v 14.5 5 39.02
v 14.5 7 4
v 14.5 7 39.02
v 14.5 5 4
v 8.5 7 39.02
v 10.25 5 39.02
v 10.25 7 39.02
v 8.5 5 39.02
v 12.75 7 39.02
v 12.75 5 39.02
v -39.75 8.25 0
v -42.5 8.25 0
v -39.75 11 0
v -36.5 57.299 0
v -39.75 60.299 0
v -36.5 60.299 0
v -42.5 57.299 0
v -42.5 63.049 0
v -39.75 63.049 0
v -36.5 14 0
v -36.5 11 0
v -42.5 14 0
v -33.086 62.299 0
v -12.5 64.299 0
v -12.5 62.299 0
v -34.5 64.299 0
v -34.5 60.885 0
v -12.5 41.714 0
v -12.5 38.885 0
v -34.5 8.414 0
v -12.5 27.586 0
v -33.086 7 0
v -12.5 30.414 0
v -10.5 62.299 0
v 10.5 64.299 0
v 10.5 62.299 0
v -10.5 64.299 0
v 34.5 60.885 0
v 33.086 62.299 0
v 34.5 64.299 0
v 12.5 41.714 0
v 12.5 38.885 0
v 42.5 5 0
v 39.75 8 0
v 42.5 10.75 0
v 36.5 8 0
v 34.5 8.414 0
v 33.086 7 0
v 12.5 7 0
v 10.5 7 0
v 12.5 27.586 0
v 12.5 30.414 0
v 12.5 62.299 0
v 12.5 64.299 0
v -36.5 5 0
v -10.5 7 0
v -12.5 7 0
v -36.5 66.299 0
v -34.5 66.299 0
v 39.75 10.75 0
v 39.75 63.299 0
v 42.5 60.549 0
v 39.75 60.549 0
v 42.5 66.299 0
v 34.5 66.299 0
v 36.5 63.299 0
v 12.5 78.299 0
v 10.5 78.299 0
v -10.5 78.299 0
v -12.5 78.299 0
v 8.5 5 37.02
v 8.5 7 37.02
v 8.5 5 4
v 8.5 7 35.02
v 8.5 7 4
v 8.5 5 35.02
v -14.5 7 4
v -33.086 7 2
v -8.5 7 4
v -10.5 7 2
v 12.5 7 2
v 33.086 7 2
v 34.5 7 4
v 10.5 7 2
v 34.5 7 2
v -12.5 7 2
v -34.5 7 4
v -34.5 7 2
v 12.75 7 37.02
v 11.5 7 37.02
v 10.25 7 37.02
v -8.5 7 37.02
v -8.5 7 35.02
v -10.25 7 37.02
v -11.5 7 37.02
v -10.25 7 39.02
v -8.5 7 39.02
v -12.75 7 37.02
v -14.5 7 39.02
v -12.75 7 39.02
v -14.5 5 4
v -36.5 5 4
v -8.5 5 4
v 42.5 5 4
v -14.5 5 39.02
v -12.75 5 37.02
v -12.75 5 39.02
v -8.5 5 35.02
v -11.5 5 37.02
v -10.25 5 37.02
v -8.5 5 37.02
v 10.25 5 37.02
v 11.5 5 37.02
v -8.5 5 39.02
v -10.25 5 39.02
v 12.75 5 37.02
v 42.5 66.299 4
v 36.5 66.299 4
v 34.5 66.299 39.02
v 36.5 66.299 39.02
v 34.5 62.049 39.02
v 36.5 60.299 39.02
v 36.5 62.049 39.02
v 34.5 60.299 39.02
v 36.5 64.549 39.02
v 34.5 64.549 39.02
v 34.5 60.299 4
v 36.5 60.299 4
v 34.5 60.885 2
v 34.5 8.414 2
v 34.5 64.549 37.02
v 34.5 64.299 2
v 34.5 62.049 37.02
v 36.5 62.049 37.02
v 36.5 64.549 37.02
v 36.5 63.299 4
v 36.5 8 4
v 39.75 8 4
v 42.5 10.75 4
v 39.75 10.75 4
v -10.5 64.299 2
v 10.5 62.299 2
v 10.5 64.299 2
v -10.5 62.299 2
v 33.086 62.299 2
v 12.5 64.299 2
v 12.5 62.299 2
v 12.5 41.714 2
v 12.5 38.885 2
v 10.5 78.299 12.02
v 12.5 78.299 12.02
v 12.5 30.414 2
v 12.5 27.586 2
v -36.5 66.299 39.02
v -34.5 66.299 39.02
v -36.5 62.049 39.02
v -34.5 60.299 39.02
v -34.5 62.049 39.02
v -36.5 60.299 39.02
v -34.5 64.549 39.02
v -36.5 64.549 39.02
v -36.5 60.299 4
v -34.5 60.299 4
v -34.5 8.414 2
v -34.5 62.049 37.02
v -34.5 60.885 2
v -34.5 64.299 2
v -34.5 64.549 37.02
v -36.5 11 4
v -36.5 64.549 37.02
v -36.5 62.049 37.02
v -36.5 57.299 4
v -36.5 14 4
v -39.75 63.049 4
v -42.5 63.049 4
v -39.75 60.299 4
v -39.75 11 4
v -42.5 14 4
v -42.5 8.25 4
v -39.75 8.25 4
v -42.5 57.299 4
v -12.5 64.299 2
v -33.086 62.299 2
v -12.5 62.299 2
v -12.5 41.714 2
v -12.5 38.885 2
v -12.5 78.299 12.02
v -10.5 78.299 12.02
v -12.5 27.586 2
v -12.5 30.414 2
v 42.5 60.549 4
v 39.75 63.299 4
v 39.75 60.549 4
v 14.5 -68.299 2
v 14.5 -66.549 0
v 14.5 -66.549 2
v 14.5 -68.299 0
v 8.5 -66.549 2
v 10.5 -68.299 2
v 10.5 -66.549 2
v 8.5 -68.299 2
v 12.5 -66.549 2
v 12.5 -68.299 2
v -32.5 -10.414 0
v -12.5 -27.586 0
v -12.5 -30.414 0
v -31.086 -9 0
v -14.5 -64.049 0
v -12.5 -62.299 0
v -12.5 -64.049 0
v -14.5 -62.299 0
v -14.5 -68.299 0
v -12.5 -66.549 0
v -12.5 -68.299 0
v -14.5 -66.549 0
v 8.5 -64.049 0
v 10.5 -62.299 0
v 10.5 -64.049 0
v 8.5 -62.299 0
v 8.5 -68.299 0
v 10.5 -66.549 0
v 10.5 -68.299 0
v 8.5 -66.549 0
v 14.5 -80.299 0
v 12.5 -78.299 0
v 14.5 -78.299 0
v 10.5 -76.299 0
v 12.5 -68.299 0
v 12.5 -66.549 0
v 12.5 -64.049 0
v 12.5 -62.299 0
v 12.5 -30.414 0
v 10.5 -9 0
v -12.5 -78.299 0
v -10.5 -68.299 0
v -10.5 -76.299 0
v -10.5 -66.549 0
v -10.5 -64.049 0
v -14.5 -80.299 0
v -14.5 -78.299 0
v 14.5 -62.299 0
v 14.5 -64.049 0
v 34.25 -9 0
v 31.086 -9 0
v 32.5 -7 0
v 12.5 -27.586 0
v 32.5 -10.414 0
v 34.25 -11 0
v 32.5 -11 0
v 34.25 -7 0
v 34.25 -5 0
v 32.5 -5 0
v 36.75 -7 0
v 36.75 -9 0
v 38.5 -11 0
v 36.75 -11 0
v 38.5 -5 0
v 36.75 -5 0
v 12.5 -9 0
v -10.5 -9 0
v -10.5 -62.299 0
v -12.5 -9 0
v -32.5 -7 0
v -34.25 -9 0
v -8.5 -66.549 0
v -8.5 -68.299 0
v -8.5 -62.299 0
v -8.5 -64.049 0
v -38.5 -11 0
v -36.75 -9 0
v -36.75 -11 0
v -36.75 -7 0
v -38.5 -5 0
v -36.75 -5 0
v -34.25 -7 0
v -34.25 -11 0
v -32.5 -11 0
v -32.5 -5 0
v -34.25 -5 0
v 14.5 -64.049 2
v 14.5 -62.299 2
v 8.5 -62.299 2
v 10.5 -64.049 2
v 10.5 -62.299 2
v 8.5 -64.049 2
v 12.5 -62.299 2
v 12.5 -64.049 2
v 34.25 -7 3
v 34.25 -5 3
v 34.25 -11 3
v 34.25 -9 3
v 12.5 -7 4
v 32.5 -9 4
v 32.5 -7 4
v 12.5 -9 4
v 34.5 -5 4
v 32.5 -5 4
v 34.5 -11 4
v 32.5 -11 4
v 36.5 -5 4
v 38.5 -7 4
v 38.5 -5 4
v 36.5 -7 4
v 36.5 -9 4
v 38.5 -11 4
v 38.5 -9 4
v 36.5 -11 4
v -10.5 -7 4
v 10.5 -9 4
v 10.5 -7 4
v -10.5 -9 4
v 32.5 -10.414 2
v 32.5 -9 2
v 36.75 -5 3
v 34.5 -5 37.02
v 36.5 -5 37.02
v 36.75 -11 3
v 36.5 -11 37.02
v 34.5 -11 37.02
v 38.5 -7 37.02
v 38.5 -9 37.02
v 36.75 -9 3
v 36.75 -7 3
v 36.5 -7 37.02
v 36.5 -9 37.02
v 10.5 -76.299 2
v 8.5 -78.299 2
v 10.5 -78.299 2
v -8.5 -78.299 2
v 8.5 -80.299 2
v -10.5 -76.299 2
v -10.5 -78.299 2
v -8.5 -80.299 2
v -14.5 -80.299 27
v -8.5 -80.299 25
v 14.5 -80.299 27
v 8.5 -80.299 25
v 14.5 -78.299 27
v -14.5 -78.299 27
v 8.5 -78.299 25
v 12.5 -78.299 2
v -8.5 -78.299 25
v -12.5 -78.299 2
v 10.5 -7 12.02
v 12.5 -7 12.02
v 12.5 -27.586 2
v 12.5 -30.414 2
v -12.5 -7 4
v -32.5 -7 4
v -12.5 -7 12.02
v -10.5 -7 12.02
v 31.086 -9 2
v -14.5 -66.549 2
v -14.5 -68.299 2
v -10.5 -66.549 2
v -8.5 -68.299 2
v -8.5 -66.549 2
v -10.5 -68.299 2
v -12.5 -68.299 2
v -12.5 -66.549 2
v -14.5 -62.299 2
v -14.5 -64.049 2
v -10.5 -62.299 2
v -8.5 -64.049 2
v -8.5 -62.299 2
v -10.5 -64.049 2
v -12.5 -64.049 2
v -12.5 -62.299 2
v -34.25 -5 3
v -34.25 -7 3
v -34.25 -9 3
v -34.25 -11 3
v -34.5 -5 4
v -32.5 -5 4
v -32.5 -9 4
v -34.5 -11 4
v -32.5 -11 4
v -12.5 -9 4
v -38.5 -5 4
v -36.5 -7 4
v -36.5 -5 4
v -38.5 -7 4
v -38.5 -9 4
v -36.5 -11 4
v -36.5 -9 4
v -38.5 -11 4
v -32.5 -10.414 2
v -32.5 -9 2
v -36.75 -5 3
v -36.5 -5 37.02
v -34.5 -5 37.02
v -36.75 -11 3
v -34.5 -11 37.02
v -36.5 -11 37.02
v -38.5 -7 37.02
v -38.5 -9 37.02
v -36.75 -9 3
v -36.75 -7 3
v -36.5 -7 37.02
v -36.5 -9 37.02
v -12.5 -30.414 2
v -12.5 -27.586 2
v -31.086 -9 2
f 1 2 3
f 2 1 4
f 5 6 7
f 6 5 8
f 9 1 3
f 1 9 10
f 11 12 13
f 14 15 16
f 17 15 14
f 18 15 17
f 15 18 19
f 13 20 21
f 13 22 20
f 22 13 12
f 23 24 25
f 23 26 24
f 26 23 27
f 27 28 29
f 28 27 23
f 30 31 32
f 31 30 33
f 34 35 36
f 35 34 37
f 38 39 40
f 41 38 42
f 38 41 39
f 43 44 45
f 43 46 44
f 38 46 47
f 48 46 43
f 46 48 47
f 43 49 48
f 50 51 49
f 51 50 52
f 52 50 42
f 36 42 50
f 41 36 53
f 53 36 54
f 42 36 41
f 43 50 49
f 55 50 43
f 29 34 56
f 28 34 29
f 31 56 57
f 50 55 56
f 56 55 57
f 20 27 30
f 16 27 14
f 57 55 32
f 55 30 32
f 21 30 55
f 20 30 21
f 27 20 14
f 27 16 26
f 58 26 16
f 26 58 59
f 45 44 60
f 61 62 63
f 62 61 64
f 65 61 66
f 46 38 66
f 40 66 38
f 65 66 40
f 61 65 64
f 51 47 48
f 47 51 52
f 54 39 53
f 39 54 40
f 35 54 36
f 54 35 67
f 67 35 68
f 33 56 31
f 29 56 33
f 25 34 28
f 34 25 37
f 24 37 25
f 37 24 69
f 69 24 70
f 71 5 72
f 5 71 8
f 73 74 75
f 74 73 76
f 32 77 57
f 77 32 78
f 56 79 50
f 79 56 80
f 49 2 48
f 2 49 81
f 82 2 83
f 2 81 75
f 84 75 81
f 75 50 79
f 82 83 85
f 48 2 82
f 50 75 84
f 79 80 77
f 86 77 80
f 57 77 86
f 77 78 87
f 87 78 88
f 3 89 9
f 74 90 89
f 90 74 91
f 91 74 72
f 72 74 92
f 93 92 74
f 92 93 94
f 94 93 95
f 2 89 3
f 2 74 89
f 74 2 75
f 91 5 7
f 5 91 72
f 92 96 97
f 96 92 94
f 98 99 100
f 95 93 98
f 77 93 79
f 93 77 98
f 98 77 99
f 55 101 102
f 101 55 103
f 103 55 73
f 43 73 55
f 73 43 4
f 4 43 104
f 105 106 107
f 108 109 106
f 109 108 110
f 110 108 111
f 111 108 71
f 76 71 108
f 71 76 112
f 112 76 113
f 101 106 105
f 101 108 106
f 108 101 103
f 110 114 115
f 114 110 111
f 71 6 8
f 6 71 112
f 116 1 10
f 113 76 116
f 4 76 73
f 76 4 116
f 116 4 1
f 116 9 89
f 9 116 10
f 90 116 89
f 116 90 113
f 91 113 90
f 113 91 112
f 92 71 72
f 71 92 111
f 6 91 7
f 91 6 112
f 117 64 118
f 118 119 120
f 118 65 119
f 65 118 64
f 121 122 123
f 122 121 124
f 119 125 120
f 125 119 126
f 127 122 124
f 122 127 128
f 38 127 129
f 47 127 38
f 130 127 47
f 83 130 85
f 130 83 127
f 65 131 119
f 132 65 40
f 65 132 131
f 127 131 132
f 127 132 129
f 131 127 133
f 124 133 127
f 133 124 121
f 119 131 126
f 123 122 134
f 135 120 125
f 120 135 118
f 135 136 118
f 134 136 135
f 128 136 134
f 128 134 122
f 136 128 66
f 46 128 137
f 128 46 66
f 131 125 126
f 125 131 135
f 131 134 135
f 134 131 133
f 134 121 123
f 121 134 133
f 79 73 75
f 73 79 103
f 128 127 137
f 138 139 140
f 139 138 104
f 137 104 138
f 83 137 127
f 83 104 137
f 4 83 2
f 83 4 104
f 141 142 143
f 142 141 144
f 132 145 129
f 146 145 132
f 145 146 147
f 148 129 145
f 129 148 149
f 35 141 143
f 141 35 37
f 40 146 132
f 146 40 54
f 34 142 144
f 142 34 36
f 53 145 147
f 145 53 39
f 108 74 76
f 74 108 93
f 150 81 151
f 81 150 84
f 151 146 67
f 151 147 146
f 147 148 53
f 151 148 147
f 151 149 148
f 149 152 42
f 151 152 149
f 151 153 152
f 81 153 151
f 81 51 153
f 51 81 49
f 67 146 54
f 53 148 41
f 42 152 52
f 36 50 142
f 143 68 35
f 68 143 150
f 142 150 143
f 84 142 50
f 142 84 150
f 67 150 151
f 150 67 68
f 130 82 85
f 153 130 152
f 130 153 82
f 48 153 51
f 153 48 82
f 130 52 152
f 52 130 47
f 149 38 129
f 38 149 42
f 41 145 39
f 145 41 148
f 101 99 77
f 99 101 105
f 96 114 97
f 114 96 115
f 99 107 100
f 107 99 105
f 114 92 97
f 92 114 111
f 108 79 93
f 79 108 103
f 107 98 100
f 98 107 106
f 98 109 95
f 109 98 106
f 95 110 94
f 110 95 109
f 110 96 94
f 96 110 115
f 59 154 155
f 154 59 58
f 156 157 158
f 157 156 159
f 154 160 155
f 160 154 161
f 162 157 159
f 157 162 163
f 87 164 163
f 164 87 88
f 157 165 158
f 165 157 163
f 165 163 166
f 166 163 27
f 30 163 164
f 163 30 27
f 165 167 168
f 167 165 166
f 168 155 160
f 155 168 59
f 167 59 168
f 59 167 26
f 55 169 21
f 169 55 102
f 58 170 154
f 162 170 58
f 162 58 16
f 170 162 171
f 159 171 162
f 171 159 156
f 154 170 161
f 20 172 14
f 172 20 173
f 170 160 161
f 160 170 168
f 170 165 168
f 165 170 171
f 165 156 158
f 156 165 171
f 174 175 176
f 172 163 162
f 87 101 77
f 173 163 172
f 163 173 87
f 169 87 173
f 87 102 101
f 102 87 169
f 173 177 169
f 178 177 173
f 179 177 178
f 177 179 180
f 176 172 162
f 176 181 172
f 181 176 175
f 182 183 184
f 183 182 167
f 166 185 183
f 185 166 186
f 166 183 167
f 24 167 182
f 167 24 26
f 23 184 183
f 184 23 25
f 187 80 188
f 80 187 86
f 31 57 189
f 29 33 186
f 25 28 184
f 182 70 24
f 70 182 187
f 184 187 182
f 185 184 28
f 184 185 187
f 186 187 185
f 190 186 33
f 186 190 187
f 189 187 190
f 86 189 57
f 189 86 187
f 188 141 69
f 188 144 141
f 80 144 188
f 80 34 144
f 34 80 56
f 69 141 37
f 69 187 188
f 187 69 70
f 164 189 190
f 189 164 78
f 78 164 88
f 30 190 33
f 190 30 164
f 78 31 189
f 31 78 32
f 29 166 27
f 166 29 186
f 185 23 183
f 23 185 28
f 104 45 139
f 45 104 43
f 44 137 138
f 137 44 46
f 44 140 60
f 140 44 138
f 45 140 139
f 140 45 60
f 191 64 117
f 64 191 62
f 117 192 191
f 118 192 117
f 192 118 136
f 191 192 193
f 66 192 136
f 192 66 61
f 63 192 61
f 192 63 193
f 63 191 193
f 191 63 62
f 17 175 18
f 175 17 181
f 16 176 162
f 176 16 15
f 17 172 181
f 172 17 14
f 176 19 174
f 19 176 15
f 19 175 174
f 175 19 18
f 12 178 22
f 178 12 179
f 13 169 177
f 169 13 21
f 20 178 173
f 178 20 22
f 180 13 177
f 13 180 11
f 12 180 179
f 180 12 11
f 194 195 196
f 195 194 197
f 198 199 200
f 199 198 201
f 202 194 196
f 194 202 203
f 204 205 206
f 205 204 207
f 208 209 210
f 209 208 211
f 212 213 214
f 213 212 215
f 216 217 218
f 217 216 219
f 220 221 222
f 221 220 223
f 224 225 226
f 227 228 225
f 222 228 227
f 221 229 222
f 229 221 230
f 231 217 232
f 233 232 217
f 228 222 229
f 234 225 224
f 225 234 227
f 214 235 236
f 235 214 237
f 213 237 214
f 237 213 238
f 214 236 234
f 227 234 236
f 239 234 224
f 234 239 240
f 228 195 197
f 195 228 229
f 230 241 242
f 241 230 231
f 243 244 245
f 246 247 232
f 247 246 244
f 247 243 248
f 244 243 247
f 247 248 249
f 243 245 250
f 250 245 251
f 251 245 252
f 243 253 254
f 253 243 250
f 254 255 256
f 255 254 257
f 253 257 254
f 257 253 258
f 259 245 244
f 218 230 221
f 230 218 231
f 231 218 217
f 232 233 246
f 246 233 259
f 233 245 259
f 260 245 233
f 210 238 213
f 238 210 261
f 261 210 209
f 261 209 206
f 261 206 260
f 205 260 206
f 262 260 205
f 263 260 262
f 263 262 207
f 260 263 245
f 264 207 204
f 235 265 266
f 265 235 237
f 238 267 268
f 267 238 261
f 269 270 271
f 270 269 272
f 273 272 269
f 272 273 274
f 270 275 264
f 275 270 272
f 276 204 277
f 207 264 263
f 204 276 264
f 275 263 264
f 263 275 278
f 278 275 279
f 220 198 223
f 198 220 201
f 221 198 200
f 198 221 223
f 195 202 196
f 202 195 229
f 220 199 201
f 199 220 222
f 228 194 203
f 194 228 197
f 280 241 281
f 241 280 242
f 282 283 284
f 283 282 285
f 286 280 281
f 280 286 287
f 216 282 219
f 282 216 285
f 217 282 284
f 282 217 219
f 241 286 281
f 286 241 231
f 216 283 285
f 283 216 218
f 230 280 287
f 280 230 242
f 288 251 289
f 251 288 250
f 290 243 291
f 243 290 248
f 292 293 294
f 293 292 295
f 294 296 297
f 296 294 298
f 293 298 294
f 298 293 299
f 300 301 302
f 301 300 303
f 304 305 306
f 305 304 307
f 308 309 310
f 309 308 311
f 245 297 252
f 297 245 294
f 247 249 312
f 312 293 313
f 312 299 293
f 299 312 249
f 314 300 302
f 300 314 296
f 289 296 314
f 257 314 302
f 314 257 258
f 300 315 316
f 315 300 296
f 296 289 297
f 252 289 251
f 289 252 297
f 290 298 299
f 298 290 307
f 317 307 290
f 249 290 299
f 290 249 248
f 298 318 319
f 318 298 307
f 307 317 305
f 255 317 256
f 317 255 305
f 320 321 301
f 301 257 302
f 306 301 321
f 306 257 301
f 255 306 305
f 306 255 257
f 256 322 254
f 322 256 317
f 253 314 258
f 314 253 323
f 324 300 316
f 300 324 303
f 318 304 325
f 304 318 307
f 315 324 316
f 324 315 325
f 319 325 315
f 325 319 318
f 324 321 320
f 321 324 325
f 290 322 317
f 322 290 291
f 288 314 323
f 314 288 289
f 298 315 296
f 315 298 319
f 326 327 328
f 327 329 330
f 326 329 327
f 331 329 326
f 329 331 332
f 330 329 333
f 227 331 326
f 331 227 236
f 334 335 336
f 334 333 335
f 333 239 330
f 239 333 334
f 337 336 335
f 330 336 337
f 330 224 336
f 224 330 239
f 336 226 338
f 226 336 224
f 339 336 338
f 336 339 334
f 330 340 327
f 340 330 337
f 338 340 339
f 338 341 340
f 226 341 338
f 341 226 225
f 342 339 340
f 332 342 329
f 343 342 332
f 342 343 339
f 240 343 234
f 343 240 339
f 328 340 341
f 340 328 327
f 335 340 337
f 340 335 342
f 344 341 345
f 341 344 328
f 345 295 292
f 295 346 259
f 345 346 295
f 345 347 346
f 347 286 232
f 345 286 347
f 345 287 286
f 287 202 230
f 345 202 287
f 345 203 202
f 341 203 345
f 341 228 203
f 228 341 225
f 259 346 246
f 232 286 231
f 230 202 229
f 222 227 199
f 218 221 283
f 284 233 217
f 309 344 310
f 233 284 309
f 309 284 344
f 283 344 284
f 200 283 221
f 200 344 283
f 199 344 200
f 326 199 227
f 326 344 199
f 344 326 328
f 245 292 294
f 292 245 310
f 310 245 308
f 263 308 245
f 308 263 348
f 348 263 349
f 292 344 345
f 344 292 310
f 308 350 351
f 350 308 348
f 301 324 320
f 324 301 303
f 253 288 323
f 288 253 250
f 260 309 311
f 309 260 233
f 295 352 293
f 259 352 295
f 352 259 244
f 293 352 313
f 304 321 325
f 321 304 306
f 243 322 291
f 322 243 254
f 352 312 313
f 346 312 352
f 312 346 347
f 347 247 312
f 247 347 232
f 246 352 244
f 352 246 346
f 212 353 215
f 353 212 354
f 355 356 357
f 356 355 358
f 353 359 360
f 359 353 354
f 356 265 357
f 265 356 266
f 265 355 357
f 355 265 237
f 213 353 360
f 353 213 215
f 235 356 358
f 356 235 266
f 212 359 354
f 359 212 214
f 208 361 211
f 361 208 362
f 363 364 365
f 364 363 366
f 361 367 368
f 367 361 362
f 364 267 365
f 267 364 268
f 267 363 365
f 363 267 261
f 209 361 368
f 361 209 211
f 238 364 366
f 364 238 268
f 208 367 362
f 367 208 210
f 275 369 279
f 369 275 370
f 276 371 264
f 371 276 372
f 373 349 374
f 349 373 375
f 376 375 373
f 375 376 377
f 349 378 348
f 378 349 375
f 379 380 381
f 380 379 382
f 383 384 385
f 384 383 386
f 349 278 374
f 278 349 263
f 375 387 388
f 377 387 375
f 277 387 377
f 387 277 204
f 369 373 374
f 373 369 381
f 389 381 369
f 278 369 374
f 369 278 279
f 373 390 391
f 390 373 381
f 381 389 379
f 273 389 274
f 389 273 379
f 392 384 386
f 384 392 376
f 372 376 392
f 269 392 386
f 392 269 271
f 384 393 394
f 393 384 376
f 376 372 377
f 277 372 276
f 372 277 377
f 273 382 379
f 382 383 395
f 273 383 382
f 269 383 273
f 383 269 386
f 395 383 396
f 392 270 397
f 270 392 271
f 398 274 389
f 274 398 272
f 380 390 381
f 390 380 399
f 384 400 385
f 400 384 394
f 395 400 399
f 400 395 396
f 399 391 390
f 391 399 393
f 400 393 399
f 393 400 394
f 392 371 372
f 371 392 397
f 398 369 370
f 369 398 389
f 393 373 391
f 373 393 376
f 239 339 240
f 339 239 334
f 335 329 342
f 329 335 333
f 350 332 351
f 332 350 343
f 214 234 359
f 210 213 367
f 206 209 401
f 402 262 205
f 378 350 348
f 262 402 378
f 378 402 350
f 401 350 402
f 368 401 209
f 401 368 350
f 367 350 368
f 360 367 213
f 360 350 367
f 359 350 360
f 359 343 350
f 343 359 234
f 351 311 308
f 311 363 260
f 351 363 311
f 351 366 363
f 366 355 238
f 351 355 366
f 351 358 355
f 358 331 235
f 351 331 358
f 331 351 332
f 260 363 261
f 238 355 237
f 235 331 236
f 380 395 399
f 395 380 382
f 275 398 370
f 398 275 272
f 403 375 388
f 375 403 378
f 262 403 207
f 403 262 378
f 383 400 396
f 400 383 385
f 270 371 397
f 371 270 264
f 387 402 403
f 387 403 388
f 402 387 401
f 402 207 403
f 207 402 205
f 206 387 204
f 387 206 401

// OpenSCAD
/* [Main] */

// What would you like to generate?
part = "both"; // [base:Base Only,top:Top Only,both:Base and Top]

// Number of holders
holder_count = 1;

// Width of cards to be used (mm)
card_width = 64;

// Length of cards to be used (mm)
card_length = 88;

// Height of holder (approx height of deck) (mm)
holder_height = 25;	// Height of holder

/* [Tweaking] */

// How far back the top layer should be (mm)
top_offset = 14;
// How much the cards overhang the ends of the holder (mm)
overhang = 16;
// The angle of the angled supports
angle = 8;
// Gap added to card with to give width of holder
card_gap = 5;
// Thickness of support bars
bar_thickness = 2;
// Gap to allow top/bottom to clip together
support_gap = 0.25;
// Gap to allow clips to clip together
clip_card_gap = 0.25;
// Distance between top and bottom if printing both
both_gap = 10;


/****************************************
 *
 ****************************************/

holder_width = card_width + card_gap;
angled_length = cos(angle) * (card_length - overhang);;
angled_height = (tan(angle) * angled_length) + bar_thickness;
base_length = angled_length - top_offset;
base_full_length = angled_length + bar_thickness;
top_full_length = angled_length + (bar_thickness * 2);
clip_thickness = bar_thickness * 1.5;
// Offset of angled Support (1/6th from 1/2 = 1/3rd!)
offset = (holder_width) / 6;
// Offset for diagonal bars
diag_offset = sin(45) * bar_thickness;

print_part();

module print_part()
{
	if (part == "base")
	{
		bases();
	} else if (part == "top") {
		tops();
	} else if (part == "both") {
		// translate stuff here...
		translate([0, (base_full_length + both_gap) / 2, 0])
			bases();
		translate([0, -(top_full_length + both_gap) / 2, 0])
			tops();
	}
}

module tops()
{
	full_width = (holder_width + bar_thickness) * (holder_count) + (bar_thickness * 3);
	translate([full_width/2, -top_full_length/2, 0])
	{
		// Draw each base
		for(i=[1:holder_count])
		{
			translate([-(holder_width + bar_thickness) * (i-1),0,0])
				singleTop();
		}
		// Thicker bars at ends
		translate([-bar_thickness, angled_length, 0])
		{
			cube([bar_thickness, bar_thickness, holder_height + angled_height]);
		}
		translate([-full_width, angled_length, 0])
		{
			cube([bar_thickness, bar_thickness, holder_height + angled_height]);
		}
	}
}

module singleTop()
{
	// Length of diagonal bar
	diag_length = 
		(
			(offset*2 - bar_thickness)	// Distance between middle of angled support
												// 	and inside edge of side bar
			+ (diag_offset/2) 				// Distance from inside edge of side bar 
												//		to rotation axis of diagional bar
			+ (bar_thickness-diag_offset)	// Distance from rotation axis 
												//		to centre of diagonal bar
		) / sin(45);

	translate([-holder_width/2-(bar_thickness*2),0,0])
	{
		// As the base is mirrored down the middle, do a side at a time
		for (m=[[0,0,0],[1,0,0]])
		{
			mirror(m)
			{
				// Bar at back
				cube([offset, bar_thickness * 2, bar_thickness]);

				// Support at back
				translate([offset-(bar_thickness * 1.5),0,0])
					cube([bar_thickness * 3, bar_thickness, holder_height + bar_thickness]);
				translate([0,0,holder_height])
					cube([offset, bar_thickness, bar_thickness]);

				// Angled Support
				translate([offset-(bar_thickness * 0.5),bar_thickness,0])
					angledSupport();

				// Notches
				translate([offset-(bar_thickness * 1.5), 0, 0])
				{
					for(s=[
								[0, top_offset - bar_thickness, 0],
								[0, top_offset + bar_thickness + support_gap, 0]
							])
					{
						translate(s)
							cube([bar_thickness * 3, bar_thickness - support_gap, bar_thickness]);
					}
				}

				// Bar at front
				translate([0, angled_length, 0])
					cube([holder_width/2 + (bar_thickness * 2), bar_thickness, bar_thickness * 2]);

				// Front support
				translate([holder_width/2 - bar_thickness, angled_length - bar_thickness, 0])
				{
					for(t=[
							[0, 0, 0],
							[bar_thickness*2 + support_gap, 0, 0]
						])
					{
						translate(t)
							cube([bar_thickness - support_gap, bar_thickness * 3, bar_thickness * 2]);
					}

					translate([bar_thickness,0,bar_thickness * 1.5])
					{
						cube([bar_thickness, 
								bar_thickness * 3, 
								holder_height + angled_height - (bar_thickness * 1.5)]);
					}

					translate([0, 0, bar_thickness * 1.5])
						cube([bar_thickness * 3, bar_thickness * 3, bar_thickness * 0.5]);
				}

				// Diagonal supports
				translate([holder_width/2, angled_length + bar_thickness - diag_offset, 0])
					rotate([0,0,135])
						cube([bar_thickness,diag_length,bar_thickness]);
			}
		}
	}	
}


module bases()
{
	// Move bases so generated object is in middle of area
	translate([
			((holder_width * holder_count) + (bar_thickness * (holder_count + 1)))/2,
			-base_full_length/2,
			0])
	{
		// Draw each base
		for(i=[1:holder_count])
		{
			translate([-(holder_width + bar_thickness) * (i-1),0,0])
				singleBase();
		}

		// Add the clips - all mirrored/rotated in their own way

		clip();

		translate([0,base_length + (bar_thickness * 2),0])
			mirror([0,1,0])
				clip();	

		translate([-(holder_width + bar_thickness) * (holder_count) - bar_thickness,
						base_length + (bar_thickness * 2) - (clip_thickness * 3),
						0])
			mirror([1,0,0])
				clip();

		translate([-(holder_width + bar_thickness) * (holder_count) - bar_thickness,
						(clip_thickness * 3),
						0])
			rotate([0,0,180])
				clip();

	}
}


module singleBase()
{
	// Length of diagonal bar
	diag_length = 
		(
			(offset*2) 						// Distance between middle of angled support
												// 	and inside edge of side bar
			+ (diag_offset/2) 				// Distance from inside edge of side bar 
												//		to rotation axis of diagional bar
			+ (bar_thickness-diag_offset)	// Distance from rotation axis 
												//		to centre of diagonal bar
		) / sin(45);

	translate([-holder_width/2-bar_thickness,0,0])
	{
		// As the base is mirrored down the middle, do a side at a time
		for (m=[[0,0,0],[1,0,0]])
		{
			mirror(m)
			{
				// Bar at back
				cube([holder_width/2, bar_thickness, bar_thickness * 2]);
				// Bar at front
				translate([0,base_length,0])
					cube([holder_width/2, bar_thickness, bar_thickness]);
				// Bar at top of back support
				translate([0,0,holder_height + angled_height - bar_thickness])
					cube([offset, bar_thickness, bar_thickness]);		

				// Side bar
				translate([holder_width/2,0,0])
					cube([bar_thickness, base_length + bar_thickness, bar_thickness * 2]);

				// angled Support
				translate([offset-(bar_thickness * 0.5),bar_thickness,0])
					angledSupport();

				// Back support
				translate([offset-(bar_thickness * 1.5),0,0])
					verticalSupport();
				// Front support
				translate([holder_width/2 + bar_thickness,base_length - bar_thickness,0])
					rotate([0,0,90])
						verticalSupport();

				// Diagonal at back
				translate([holder_width/2 + (bar_thickness - diag_offset), 0, 0])
					rotate([0,0,45])
						cube([bar_thickness,diag_length,bar_thickness]);
				// Diagonal at front
				translate([holder_width/2 + bar_thickness, base_length + bar_thickness - diag_offset, 0])
					rotate([0,0,135])
						cube([bar_thickness,diag_length,bar_thickness]);
			}
		}
	}
}


module angledSupport()
{
/*
	// Calculate the maximum height of holes
	max_hole = floor(
		((angled_length - (bar_thickness * 2)) * tan(angle))
		- bar_thickness);

	difference()
	{
*/	
		// The triangle, with a bar of bar_thickness underneath
		polyhedron(points=[ 
			[0,0,0], [bar_thickness,0,0], 
			[0,angled_length,0], [bar_thickness,angled_length,0],
			[0,angled_length,angled_height], [bar_thickness,angled_length,angled_height],
			[0,0,bar_thickness], [bar_thickness,0,bar_thickness] ],
			faces=[
				[0,1,2], [1,3,2],
				[2,3,5], [2,5,4],
				[4,5,6], [5,7,6],
				[0,6,1], [6,7,1],
				[0,2,6], [2,4,6],
				[3,1,7], [5,3,7]
		]);
/*
		// Step through heights of holes and add them
		if(max_hole>0)
		{
			for (v=[bar_thickness+1:bar_thickness+max_hole])
			{
				translate([-0.1, v/tan(angle), bar_thickness])
					cube([bar_thickness + 0.2, 
							min((v+1)/tan(angle), angled_length)
								-(v/tan(angle))
								-bar_thickness,
							(v-bar_thickness)]);
			}
		}
	}
*/
}


module verticalSupport()
{
	difference() {
		cube([bar_thickness*3,bar_thickness,holder_height + angled_height + bar_thickness]);
		translate([bar_thickness-support_gap,0,holder_height + angled_height]) {
			cube([bar_thickness+(support_gap * 2),bar_thickness,bar_thickness * 1.1]);
		}
	}
}


module clip()
{
	translate([-bar_thickness,0,0])
		cube([clip_thickness * 2 + bar_thickness, clip_thickness, bar_thickness * 2]);
	translate([clip_thickness + clip_card_gap, clip_thickness, 0])
		cube([clip_thickness - clip_card_gap, clip_thickness - clip_card_gap, bar_thickness * 2]);
}
